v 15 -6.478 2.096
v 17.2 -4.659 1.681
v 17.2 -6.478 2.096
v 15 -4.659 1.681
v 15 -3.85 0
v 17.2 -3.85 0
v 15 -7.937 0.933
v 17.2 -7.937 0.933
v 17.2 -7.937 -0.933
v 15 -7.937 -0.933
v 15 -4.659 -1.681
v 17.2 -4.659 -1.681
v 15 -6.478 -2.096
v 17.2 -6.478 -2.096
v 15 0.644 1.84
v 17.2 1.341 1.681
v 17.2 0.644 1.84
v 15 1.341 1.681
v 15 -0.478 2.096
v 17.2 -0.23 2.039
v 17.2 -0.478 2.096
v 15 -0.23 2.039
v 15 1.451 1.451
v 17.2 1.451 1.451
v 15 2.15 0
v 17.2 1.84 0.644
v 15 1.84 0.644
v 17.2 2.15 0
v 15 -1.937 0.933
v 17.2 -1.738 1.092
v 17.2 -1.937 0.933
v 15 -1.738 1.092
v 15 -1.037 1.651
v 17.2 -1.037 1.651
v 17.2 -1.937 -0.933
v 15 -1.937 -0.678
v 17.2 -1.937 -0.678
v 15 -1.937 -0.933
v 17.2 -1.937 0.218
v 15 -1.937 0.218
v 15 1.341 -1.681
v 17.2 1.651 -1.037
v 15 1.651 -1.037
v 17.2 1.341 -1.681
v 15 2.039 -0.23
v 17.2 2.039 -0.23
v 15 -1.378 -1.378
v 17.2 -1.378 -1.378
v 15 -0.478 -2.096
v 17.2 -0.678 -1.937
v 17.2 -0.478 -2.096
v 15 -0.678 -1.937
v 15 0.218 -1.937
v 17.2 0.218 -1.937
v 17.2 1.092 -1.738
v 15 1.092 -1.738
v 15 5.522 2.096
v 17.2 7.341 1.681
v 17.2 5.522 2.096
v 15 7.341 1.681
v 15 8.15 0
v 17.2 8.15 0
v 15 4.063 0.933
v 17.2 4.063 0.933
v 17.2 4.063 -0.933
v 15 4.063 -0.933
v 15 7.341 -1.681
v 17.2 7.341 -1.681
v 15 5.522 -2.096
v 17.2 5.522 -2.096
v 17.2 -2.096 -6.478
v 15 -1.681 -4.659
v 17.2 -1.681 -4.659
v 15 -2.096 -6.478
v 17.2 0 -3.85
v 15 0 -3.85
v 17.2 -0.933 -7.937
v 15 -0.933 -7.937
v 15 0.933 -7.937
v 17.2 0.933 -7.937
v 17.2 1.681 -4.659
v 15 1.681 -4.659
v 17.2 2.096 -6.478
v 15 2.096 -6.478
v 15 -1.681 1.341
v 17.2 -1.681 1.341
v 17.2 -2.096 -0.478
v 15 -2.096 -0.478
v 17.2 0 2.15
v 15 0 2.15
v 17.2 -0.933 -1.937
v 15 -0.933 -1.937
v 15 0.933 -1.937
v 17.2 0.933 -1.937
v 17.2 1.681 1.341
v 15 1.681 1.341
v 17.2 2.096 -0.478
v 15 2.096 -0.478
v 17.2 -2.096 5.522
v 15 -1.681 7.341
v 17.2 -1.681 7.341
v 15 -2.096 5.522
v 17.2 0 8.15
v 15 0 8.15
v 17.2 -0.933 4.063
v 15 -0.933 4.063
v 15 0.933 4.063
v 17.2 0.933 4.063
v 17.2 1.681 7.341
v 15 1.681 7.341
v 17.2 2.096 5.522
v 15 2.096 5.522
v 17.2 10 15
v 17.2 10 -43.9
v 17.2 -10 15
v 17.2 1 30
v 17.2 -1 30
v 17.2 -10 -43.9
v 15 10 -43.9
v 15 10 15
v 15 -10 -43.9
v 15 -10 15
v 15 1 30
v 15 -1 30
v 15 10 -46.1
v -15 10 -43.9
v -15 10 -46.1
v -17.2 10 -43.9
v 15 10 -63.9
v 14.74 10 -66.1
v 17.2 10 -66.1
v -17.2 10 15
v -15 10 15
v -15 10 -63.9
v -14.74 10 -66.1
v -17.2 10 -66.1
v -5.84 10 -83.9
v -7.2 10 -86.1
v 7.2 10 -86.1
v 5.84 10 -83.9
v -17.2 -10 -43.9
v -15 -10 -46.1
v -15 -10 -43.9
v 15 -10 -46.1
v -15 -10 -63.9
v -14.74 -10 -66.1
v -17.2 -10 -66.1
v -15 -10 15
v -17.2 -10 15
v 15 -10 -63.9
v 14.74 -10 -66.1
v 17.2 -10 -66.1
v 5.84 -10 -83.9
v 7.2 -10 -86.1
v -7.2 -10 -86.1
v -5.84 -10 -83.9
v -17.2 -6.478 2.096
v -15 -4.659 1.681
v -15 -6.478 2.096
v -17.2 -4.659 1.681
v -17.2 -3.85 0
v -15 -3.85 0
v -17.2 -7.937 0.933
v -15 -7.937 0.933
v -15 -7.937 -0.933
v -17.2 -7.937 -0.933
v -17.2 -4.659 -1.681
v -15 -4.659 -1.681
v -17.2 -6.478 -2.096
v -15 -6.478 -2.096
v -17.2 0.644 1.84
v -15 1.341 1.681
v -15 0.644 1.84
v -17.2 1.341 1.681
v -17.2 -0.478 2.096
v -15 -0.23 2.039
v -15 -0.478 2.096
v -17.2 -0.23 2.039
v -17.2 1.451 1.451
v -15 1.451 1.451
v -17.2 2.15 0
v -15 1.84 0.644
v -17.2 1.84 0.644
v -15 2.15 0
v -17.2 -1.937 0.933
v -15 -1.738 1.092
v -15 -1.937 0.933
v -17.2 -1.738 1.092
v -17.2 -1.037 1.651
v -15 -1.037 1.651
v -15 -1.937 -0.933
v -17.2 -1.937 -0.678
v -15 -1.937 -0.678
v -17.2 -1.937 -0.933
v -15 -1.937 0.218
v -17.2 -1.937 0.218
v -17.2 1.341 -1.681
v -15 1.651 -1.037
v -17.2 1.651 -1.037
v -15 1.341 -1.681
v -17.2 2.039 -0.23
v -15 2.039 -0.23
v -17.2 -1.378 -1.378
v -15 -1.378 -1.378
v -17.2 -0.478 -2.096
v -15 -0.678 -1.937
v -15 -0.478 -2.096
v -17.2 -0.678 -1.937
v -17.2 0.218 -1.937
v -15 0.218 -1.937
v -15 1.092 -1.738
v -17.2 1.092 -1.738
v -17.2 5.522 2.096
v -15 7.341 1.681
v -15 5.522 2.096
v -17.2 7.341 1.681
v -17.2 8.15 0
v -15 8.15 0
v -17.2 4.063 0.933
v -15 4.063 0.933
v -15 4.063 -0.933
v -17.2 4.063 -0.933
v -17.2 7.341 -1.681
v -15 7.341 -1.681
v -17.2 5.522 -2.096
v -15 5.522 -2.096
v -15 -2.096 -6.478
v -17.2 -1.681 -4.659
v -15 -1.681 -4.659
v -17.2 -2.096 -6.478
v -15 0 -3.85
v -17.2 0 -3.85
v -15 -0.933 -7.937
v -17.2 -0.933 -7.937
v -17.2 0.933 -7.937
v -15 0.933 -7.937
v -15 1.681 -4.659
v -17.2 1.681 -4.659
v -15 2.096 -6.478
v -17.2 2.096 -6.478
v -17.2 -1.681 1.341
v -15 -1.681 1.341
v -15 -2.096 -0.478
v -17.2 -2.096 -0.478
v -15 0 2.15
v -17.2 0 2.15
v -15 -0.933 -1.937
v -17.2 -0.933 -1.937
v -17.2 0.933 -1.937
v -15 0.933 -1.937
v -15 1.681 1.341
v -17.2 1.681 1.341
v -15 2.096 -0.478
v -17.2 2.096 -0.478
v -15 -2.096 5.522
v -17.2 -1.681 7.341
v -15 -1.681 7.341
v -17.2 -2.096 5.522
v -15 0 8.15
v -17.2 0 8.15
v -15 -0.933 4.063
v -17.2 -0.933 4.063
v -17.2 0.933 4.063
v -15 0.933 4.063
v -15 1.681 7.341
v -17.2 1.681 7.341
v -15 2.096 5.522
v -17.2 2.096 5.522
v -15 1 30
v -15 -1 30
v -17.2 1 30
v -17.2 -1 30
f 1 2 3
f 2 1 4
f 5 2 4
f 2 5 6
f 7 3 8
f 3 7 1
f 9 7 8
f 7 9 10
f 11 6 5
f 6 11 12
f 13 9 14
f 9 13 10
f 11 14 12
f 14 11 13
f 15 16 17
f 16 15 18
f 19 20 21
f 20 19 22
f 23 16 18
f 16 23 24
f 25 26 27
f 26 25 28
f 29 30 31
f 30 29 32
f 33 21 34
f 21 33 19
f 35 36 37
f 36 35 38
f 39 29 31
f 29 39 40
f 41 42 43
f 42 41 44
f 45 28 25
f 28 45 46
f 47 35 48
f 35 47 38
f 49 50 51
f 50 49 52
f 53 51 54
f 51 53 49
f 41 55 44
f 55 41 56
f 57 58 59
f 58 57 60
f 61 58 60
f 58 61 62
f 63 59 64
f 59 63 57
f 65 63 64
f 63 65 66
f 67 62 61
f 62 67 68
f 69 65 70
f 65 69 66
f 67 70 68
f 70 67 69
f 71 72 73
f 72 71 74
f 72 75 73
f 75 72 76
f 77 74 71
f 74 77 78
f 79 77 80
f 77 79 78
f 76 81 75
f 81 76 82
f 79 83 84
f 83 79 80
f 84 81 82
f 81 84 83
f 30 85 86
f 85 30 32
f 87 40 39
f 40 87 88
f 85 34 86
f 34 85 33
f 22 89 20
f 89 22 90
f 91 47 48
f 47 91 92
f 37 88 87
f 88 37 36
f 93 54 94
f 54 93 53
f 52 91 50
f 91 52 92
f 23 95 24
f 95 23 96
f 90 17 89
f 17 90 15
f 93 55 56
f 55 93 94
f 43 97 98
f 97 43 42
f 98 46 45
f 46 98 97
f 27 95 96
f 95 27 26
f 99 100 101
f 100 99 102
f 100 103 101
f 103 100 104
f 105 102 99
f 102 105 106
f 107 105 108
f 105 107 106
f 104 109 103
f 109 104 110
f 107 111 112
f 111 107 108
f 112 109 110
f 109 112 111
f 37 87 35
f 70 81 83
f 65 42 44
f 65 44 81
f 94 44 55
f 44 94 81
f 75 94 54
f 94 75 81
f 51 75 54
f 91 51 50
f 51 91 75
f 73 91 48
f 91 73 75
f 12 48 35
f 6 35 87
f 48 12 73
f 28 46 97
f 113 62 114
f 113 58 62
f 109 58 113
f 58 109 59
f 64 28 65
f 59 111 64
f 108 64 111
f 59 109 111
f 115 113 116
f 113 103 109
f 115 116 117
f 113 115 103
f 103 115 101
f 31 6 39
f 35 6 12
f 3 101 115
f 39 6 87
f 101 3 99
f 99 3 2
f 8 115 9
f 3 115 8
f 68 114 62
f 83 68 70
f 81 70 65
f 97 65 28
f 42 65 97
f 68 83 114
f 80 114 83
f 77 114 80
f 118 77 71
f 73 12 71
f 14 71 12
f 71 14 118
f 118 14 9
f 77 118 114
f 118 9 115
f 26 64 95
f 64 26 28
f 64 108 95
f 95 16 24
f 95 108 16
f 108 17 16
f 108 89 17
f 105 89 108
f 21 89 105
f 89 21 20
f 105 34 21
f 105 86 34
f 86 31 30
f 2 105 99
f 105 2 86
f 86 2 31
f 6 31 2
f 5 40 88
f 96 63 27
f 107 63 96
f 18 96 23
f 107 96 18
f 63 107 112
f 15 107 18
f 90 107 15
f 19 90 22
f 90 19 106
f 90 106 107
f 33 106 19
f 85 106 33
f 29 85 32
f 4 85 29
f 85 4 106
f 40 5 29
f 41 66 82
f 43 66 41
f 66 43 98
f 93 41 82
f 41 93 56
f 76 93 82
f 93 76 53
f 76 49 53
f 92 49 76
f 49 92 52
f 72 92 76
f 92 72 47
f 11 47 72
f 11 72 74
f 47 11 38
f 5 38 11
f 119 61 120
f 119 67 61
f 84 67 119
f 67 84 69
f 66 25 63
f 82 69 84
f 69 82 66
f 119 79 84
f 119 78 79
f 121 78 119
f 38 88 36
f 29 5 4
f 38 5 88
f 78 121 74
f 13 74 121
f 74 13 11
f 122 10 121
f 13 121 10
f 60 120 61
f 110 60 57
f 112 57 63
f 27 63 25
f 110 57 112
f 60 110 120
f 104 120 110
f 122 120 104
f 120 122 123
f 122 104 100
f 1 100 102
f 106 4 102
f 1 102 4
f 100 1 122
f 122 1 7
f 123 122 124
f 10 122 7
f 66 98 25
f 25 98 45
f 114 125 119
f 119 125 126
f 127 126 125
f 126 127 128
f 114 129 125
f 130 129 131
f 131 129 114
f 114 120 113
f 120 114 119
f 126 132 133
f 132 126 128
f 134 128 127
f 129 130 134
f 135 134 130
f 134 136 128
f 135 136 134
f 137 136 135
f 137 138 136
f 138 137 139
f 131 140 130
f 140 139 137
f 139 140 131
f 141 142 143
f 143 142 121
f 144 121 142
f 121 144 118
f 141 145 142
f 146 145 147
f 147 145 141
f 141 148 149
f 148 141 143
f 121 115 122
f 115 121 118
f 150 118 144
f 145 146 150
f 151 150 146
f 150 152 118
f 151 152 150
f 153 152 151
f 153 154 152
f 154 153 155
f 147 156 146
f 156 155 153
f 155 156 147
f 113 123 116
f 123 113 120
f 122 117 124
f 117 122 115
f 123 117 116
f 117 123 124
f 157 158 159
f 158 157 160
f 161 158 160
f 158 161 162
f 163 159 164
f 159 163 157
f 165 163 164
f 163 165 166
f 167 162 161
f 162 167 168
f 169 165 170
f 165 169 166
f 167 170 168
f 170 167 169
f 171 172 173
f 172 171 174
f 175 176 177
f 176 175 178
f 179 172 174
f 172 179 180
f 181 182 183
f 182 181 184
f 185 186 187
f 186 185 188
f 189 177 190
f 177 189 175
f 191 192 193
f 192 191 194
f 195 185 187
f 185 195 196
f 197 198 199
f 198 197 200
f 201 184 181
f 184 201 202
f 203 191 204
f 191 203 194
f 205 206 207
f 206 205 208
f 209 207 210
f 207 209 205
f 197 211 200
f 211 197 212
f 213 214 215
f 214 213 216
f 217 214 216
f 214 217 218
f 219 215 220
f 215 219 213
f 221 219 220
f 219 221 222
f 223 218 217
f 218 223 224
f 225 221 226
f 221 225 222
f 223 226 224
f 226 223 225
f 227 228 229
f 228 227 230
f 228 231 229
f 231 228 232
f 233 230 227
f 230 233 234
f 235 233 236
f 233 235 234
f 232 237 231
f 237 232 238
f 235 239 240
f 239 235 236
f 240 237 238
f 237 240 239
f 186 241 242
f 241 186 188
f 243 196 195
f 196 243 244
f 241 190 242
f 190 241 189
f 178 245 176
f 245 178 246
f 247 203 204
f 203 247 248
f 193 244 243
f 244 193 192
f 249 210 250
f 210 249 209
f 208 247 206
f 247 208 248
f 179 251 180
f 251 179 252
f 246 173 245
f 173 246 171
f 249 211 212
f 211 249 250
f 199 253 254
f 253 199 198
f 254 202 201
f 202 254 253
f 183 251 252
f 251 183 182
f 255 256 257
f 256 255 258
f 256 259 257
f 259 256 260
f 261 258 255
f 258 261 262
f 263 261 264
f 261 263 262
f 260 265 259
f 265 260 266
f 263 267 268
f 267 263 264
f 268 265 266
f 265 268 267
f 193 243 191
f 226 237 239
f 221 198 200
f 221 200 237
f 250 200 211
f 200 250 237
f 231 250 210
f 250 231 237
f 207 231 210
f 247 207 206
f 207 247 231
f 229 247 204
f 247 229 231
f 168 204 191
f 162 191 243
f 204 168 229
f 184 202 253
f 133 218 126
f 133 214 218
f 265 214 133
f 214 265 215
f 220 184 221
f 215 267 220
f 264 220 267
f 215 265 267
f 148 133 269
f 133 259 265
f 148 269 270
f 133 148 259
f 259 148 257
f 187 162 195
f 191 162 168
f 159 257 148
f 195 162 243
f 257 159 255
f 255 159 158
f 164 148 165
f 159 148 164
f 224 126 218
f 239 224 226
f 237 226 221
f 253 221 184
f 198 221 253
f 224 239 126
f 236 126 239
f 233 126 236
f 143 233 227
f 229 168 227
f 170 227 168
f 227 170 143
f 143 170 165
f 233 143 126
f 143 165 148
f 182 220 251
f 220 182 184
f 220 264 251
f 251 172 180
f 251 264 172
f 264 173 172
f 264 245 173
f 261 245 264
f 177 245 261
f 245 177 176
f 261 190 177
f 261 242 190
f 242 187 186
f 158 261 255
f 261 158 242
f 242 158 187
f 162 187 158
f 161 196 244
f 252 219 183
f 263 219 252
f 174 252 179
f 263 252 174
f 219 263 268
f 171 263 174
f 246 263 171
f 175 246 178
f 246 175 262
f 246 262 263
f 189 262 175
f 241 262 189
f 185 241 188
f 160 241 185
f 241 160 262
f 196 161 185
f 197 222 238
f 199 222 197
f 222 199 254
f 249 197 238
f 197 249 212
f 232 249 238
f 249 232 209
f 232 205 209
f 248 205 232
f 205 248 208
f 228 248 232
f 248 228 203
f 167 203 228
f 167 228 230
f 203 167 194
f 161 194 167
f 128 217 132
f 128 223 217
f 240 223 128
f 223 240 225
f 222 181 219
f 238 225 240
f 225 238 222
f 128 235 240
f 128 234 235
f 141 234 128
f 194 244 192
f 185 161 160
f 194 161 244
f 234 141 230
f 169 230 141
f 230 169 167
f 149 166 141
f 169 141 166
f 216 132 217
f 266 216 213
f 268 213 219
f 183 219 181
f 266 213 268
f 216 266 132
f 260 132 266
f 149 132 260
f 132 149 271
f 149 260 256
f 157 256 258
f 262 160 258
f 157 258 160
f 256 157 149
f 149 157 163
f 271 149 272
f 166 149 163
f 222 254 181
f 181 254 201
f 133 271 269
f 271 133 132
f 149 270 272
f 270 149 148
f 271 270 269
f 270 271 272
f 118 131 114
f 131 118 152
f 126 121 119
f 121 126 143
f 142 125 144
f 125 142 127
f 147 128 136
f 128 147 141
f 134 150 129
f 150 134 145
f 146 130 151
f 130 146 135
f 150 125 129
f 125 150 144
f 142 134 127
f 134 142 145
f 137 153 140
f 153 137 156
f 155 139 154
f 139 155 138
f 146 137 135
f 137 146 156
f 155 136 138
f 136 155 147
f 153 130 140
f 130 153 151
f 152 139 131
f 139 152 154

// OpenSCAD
// file: ../util/rounded.scad
// Do a rounded cube
module rounded(x=10, y=10, z=10, r=3, center=false) {
  if (center) {
    translate([-(x/2),-(y/2),0])
      rounded(x, y, z, r);
  } else {
    translate([r,r,0])
    minkowski() {
      cube([x-2*r,y-2*r,z/2]);
      cylinder(h=z/2, r=r);
    }
  }
}
// file: ../models/ollo.scad
// Diameter of plastic ollo holes
OlloHoles = 4.3;

// Width of Ollo "real" plastic
OlloWidth = 3;

// Distance between two ollo holes
OlloSpacing = 6;

// Do an Ollo hole on the part
module olloHole(depth=2.2)
{
    translate([0,0,-0.1])
      cylinder(depth+0.2, OlloHoles/2, OlloHoles/2);
}

// Do 3 ollo holes
module threeOllo(depth=2.2)
{
  for (xy=[[-OlloSpacing,0],[0,0],[OlloSpacing,0]]) {
    translate([xy[0], xy[1], 0])
    olloHole(depth);
  }
}

// Do a servo arm holes
module servoArm(depth=2.2)
{
    threeOllo(depth);
    rotate([0,0,90])
      threeOllo(depth);
}
// main file
use <../models/ollo.scad>;
use <../util/rounded.scad>;

module leg(sizeA=60, sizeB=20, sizeC=20, sizeBottom=10,
        sizeTop=15, mode="arm", fixationAngle=0, thickness=2.2, print=false)
{
    xOffset = (mode == "side") ? -10 : 0;
    spacing = (mode == "side") ? 24 : 30;

    module legSide()
    {
        difference() {
            union() {
                translate([0,0,sizeA/2])
                    rotate([0,90,0]) {
                        cube([sizeA, 20, thickness], center=true);
                        if (mode == "side") {
                            translate([15-sizeA/2, 10, -thickness/2])
                                rotate([0,0,+fixationAngle])
                                rounded(25,10,thickness, center=true);
                        }
                    }
            }
            translate([-thickness, 0, sizeA-15]) {
                rotate([90,0,90]) {
                    if (mode == "arm") {
                        servoArm(2*thickness);
                    }
                }
                if (mode == "side") {
                    translate([0,10,0])
                        rotate([90,90-fixationAngle,90])
                        threeOllo(2*thickness);
                }
            }
        }
        translate([-thickness/2,0,sizeA]) {
            rotate([90,0,90])
                linear_extrude(thickness)
                polygon([[-10,0],[-1,sizeTop],[1,sizeTop],[10,0]]);
        }
    }

    module biais() {
        Dx = (spacing-sizeBottom)/2;
        Dy = sizeC;
        Dl = sqrt(pow(Dx,2)+pow(Dy,2));

        translate([-(spacing/2)-thickness,-10,-(sizeB+thickness/2)])
            rotate([0,atan2(Dy,Dx),0])
            cube([Dl,20,thickness]);
    }

    if (print) {
        translate([0,0,10-xOffset])
            rotate([90,0,0])
            leg(sizeA, sizeB, sizeC, sizeBottom,
                    sizeTop, mode, fixationAngle, thickness, false);
    } else {
        echo("[PART] leg");
        translate([0,xOffset,-sizeA+15]) {
            cube([spacing+thickness*2, 20, thickness], center=true);

            translate([spacing/2+thickness/2,0,0])
                legSide();
            translate([-(spacing/2+thickness/2),0,0])
                legSide();

            translate([0,0,-sizeB])
                cube([spacing+thickness*2, 20, thickness], center=true);
            translate([spacing/2+thickness/2,0,-sizeB/2])
                cube([thickness,20,sizeB], center=true);
            translate([-(spacing/2+thickness/2),0,-sizeB/2])
                cube([thickness,20,sizeB], center=true);

            translate([0,0,-(sizeB+sizeC)])
                cube([sizeBottom+thickness*2, 20, thickness], center=true);

            biais();
            mirror([1,0,0]) {
                biais();
            }
        }
    }
}

leg();
